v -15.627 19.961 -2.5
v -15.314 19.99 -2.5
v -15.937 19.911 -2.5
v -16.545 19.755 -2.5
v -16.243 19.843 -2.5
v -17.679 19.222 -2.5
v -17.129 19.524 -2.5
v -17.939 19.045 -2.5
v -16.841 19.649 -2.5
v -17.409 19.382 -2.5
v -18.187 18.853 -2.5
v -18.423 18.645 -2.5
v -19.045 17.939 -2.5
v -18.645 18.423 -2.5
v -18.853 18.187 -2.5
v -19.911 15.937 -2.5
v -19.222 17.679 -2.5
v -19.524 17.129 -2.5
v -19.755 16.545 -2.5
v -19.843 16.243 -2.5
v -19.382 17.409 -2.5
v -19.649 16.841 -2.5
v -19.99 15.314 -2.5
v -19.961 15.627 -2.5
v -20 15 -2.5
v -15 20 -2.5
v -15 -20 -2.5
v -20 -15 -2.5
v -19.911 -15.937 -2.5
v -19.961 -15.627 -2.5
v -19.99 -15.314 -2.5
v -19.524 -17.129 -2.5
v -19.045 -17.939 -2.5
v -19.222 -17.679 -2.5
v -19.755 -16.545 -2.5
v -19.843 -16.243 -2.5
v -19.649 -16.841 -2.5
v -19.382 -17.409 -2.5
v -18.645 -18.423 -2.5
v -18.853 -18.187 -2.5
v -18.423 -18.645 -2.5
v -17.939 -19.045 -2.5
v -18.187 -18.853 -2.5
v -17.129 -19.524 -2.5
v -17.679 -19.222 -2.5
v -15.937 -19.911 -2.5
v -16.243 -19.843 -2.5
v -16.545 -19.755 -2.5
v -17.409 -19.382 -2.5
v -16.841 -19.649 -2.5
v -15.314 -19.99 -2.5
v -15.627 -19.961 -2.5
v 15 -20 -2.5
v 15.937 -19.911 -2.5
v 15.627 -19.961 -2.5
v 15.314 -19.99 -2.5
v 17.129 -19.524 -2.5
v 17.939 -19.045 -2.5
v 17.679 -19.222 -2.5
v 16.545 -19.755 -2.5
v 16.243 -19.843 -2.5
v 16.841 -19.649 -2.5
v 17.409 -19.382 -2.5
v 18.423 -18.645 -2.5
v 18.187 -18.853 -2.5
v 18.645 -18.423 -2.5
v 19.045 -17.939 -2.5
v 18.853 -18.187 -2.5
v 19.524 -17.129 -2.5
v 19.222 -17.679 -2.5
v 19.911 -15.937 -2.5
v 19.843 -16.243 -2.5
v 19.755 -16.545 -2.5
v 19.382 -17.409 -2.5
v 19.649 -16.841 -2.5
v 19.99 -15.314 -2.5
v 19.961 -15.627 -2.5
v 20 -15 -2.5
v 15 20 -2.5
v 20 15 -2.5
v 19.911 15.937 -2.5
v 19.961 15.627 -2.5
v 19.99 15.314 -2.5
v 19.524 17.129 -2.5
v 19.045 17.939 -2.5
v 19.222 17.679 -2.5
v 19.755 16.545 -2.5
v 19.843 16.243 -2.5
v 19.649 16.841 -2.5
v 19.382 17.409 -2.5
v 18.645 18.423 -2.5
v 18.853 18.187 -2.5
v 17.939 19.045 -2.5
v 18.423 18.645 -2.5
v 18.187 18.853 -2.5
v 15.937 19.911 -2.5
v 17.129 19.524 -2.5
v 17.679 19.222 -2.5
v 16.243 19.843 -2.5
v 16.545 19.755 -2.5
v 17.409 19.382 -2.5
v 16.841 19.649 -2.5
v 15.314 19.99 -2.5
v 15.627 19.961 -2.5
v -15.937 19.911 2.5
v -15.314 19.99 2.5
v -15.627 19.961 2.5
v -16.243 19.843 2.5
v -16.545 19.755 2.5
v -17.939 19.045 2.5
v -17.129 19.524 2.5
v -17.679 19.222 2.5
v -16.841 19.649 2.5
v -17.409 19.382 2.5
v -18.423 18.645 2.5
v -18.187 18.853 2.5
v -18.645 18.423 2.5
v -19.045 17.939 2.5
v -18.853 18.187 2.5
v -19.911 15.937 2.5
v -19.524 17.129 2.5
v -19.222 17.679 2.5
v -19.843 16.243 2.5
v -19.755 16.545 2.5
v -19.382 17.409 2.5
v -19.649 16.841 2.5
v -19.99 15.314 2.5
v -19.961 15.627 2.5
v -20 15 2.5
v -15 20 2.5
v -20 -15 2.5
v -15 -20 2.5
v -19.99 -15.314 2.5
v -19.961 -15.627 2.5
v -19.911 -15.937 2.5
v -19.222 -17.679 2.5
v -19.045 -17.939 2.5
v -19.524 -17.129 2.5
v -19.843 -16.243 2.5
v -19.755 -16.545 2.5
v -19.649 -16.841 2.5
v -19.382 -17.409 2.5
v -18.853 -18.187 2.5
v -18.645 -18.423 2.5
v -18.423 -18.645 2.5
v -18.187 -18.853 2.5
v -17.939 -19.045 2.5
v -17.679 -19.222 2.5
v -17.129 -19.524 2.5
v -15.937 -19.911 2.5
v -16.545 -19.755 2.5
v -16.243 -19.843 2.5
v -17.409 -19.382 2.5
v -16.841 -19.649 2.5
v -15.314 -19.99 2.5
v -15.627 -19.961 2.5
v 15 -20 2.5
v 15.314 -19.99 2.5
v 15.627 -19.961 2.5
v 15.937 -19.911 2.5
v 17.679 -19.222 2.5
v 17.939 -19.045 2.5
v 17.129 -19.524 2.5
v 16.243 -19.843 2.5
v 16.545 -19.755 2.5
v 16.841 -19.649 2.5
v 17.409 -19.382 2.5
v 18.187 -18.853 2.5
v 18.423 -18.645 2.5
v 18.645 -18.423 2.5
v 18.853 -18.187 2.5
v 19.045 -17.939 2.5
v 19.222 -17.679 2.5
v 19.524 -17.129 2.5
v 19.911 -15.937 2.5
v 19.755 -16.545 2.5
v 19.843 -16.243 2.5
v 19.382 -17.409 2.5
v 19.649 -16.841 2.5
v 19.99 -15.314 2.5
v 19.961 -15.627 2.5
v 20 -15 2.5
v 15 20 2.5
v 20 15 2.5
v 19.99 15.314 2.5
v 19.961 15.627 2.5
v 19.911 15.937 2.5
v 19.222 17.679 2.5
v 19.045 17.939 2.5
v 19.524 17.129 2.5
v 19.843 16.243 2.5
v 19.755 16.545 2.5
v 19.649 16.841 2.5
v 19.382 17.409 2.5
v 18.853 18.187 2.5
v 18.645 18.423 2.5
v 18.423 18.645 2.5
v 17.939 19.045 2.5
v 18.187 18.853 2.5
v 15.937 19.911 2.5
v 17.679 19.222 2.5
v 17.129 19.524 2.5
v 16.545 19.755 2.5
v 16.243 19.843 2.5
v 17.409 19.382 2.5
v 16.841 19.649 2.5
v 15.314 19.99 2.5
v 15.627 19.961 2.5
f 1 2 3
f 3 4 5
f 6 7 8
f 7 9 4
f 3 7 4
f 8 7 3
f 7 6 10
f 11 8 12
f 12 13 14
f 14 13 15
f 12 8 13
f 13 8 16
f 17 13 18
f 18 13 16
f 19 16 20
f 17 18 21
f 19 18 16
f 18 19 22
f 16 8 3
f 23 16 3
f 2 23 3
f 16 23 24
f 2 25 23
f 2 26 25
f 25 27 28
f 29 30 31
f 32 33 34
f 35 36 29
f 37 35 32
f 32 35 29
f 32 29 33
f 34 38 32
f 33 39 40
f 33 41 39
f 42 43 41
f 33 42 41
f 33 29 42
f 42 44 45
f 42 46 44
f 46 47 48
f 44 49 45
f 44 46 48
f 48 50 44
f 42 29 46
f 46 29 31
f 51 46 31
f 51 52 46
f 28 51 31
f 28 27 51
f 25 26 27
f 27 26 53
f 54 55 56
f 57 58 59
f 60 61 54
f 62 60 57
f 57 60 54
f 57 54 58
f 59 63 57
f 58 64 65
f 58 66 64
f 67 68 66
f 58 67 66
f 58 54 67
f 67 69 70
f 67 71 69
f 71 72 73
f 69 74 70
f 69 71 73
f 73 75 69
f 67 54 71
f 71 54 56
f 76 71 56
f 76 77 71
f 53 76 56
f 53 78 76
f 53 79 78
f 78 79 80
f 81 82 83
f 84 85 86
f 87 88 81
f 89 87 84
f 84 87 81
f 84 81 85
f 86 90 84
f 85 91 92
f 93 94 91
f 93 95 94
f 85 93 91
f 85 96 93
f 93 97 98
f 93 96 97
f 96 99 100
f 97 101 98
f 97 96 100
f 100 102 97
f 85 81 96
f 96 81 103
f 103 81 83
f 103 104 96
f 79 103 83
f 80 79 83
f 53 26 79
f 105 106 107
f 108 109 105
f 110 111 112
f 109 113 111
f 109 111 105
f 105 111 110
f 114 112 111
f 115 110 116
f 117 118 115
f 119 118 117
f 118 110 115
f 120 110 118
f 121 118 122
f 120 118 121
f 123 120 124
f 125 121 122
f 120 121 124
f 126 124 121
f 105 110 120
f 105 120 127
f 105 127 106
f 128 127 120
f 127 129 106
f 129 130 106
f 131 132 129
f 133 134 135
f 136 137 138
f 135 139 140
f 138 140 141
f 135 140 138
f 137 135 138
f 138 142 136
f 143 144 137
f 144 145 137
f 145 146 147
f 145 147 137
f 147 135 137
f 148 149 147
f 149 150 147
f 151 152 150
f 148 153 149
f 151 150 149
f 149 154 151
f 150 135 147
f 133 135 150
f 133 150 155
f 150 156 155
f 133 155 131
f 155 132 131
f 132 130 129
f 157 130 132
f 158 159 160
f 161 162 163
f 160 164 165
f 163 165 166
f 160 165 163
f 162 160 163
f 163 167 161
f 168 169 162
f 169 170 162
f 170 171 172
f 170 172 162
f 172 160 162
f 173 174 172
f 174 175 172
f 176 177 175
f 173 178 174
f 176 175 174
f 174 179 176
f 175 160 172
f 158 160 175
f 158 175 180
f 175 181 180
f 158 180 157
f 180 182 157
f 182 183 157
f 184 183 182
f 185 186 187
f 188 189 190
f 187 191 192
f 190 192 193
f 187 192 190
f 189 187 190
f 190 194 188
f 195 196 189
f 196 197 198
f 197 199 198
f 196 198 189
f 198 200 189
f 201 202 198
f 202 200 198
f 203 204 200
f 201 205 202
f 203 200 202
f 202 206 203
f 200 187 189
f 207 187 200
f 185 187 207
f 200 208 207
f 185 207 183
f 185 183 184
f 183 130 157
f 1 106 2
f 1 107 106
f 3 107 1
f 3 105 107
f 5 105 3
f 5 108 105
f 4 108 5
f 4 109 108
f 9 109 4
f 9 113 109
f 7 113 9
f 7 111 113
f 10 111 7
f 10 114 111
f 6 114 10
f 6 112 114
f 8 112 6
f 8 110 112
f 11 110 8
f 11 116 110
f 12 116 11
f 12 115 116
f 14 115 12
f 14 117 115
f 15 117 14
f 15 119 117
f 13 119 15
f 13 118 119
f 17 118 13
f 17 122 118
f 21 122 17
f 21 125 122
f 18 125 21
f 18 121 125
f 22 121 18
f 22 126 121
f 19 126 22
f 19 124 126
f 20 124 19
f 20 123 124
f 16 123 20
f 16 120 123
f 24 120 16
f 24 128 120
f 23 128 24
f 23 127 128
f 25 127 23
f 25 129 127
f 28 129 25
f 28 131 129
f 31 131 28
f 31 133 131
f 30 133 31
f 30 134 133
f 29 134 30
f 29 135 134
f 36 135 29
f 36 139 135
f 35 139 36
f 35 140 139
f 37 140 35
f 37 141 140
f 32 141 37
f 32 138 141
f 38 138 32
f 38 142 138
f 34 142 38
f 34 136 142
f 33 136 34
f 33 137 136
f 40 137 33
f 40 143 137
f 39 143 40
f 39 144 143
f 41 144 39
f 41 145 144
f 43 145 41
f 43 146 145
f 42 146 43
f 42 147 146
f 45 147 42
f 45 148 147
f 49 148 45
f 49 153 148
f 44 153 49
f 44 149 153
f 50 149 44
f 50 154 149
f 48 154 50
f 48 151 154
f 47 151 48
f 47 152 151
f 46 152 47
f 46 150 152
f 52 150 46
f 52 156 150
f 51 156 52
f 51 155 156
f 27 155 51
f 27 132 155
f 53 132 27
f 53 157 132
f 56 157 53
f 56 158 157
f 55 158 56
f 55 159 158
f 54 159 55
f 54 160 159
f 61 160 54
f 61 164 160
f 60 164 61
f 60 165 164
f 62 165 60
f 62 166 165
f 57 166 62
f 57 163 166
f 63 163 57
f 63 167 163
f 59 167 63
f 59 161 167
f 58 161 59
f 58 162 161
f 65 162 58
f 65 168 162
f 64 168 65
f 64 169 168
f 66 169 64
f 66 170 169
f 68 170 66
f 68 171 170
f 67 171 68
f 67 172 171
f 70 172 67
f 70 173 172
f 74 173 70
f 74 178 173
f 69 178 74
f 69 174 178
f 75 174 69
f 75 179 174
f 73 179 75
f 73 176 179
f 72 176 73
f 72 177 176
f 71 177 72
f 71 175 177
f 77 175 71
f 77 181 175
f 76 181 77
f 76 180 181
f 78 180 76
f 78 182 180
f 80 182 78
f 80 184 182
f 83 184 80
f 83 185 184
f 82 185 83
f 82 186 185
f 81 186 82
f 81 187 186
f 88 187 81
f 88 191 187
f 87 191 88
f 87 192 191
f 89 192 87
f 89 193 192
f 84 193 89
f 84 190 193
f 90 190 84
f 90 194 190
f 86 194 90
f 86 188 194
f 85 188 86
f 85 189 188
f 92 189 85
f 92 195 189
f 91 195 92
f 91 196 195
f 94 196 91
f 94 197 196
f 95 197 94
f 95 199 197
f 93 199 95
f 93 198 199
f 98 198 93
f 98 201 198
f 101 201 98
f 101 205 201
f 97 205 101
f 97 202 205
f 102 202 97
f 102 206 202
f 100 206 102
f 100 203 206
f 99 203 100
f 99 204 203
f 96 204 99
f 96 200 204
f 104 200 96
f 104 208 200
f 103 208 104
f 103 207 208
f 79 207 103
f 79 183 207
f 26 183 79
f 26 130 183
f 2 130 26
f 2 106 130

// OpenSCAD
// file: common_plane.scad
// View
$fn = 100;
common_plane();

// Model
module common_plane (
    x               = 40,
    y               = 40,
    r               = 5,
    center          = true
) {
    
    translate([
        center ? 0 : x / 2,
        center ? 0 : y / 2,
    ]) {
    
        for (
            i = [0:1]
        ) translate([
            i % 2 ? x / 2 - r : -x / 2 + r,
            i % 2 ? -y / 2 + r : y / 2 - r,
        ]) circle(
            r = r
        );
        
        for (
            i = [0:1]
        ) translate([
            i % 2 ? x / 2 - r : -x / 2 + r,
            i % 2 ? y / 2 - r : -y / 2 + r,
        ]) circle(
            r = r
        );
        
        polygon([
            
            [-x / 2, -y / 2 + r],
            [-x / 2 + r, -y / 2],
        
            [x / 2 - r, -y / 2],
            [x / 2, -y / 2 + r],
        
            [x / 2, y / 2 - r],
            [x / 2 - r, y / 2],
        
            [-x / 2 + r, y / 2],
            [-x / 2, y / 2 - r],
        ]);
    }
}
// main file
// Uses
use <common_plane.scad>

// View
common_box();

// Model
module common_box (
    x               = 40,
    y               = 40,
    z               = 5,
    r               = 5,
    center          = true
) {
    
    linear_extrude (
        height  = z,
        center  = center
    ) common_plane(
        x       = x,
        y       = y,
        r       = r,
        center  = center
    );
}
